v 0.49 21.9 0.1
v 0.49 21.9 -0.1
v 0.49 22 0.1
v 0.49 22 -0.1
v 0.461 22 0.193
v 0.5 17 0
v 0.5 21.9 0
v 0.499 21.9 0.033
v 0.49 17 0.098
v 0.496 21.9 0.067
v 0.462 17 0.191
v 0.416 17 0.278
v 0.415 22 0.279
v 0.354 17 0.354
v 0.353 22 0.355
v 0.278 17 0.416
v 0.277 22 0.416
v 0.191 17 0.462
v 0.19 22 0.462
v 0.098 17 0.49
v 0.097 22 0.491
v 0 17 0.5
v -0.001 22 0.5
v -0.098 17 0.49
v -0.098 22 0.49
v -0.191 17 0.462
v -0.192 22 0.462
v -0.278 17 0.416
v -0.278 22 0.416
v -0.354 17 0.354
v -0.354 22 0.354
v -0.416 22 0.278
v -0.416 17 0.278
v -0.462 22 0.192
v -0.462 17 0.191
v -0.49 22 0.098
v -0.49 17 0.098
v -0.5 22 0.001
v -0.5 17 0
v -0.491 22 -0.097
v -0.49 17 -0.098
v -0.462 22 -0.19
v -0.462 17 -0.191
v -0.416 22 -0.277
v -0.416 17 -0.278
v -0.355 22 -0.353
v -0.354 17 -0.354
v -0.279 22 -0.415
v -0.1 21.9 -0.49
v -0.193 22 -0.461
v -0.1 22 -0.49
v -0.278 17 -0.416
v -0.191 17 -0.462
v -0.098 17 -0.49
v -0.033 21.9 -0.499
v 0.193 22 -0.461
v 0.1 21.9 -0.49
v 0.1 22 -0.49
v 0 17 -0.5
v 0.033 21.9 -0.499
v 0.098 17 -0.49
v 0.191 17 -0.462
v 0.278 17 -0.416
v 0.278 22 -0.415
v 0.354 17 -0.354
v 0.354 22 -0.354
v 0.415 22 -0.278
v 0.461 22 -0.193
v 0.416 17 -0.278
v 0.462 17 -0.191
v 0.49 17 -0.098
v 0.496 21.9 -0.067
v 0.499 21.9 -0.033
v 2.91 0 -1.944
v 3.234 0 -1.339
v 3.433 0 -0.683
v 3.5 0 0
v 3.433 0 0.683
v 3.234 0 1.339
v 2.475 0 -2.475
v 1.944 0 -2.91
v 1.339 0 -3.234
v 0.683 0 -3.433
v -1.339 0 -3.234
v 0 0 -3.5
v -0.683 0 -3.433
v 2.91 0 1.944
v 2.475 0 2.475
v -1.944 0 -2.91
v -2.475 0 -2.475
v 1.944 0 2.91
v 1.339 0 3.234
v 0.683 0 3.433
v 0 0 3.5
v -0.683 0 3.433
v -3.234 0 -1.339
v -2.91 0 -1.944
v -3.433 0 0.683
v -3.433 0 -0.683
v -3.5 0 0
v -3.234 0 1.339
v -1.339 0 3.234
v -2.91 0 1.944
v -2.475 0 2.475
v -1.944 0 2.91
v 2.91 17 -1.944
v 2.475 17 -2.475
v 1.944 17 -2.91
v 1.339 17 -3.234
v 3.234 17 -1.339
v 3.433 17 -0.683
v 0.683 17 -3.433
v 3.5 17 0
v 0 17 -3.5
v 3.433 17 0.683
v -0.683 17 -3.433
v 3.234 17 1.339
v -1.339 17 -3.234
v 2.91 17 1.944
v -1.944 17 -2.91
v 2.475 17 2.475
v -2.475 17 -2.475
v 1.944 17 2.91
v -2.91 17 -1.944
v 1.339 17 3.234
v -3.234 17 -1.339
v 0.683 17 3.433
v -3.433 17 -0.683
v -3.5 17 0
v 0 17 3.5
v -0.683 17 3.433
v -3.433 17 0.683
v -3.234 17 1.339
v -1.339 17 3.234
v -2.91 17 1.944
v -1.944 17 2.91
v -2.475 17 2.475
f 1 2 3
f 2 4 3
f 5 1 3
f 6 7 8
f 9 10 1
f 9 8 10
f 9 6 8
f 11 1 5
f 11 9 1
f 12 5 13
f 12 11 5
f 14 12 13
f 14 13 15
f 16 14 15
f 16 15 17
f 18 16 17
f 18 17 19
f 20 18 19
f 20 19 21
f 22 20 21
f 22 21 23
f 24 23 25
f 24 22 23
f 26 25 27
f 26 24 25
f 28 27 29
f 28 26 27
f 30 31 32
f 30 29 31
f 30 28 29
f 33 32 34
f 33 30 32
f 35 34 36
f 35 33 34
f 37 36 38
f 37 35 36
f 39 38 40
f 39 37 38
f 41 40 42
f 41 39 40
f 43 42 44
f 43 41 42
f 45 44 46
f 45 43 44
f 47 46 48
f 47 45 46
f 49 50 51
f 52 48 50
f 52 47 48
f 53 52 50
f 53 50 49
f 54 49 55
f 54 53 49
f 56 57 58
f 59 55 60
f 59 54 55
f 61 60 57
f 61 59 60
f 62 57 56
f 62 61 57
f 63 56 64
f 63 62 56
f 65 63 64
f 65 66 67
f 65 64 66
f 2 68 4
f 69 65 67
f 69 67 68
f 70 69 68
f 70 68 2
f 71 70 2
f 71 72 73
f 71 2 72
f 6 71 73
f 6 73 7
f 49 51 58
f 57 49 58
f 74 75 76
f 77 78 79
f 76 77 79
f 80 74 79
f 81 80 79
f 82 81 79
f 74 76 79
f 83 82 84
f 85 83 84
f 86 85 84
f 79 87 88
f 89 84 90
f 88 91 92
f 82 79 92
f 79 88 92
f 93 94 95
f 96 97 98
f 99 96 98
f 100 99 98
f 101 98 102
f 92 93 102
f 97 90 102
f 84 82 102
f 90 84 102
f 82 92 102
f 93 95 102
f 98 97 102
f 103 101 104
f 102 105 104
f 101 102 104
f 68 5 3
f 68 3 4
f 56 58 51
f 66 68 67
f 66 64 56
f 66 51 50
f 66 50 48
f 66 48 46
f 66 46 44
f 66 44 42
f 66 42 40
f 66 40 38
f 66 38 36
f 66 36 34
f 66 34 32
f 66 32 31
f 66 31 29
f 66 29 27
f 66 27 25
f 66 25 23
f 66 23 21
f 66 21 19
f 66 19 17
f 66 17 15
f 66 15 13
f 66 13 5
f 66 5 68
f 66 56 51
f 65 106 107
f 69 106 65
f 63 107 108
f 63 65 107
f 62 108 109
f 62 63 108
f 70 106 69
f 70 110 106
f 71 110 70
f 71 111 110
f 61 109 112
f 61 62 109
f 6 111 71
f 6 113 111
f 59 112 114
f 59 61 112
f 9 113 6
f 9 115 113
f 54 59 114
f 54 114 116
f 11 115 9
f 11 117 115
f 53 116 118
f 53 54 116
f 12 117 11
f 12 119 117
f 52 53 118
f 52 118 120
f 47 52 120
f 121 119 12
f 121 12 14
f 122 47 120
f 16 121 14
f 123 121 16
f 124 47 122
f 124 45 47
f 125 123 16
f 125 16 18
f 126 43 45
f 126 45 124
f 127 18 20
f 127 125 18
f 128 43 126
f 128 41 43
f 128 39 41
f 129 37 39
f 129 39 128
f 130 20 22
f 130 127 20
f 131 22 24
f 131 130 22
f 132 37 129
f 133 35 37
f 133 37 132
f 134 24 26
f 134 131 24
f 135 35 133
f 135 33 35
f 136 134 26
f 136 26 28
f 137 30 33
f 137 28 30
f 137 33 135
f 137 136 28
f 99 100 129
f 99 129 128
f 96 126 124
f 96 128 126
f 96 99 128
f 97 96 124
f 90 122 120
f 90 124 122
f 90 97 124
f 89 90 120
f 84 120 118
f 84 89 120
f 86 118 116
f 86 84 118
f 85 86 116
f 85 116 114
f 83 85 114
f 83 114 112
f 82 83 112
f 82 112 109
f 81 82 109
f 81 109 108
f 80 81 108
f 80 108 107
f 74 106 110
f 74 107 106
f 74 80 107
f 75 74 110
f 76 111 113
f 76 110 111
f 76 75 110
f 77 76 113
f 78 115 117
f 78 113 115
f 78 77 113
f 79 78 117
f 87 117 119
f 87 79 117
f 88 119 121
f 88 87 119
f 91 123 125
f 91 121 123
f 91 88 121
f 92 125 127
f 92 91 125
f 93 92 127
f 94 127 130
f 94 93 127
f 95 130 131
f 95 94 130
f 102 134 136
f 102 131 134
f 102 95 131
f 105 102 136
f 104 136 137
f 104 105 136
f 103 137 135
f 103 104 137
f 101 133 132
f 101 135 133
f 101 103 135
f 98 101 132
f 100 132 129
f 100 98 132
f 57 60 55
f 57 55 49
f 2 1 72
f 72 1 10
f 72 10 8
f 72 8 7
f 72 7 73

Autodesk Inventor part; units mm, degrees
ref_plane "YZ Plane" through (0, 0, 0) normal (1, 0, 0) x (0, 1, 0)
ref_plane "XZ Plane" through (0, 0, 0) normal (0, 1, 0) x (-1, 0, 0)
ref_plane "XY Plane" through (0, 0, 0) normal (0, 0, 1) x (1, 0, 0)
sketch "Sketch1" plane through (0, 0, 0) normal (0, 1, 0) x (-1, 0, 0)
  circle A0 centre (0, 0) radius 3.5
  dimension "d0" = 7
extrude "Extrusion1" add sketch "Sketch1" along normal blind 17
sketch "Sketch2" plane through (0, 17, 0) normal (0, 1, 0) x (1, 0, 0)
  circle A0 centre (0, 0) radius 0.5
  dimension "d3" = 1
extrude "Extrusion2" add sketch "Sketch2" along normal blind 5
sketch "Sketch3" plane through (0, 22, 0) normal (0, 1, 0) x (1, 0, 0)
  circle A0 centre (0, 0) radius 0.5 projected
  line L0 (-0.0995, 0.49) -> (0.0995, 0.49)
  circle A1 centre (0, 0) radius 0.5 projected
  line L1 (0.4999, 0.0075) -> (0.4999, 0.0075)
  line L2 (0.49, 0.0995) -> (0.49, -0.0995)
  dimension "d8" = 0.49
  dimension "d9" = 0.49
extrude "Extrusion3" cut sketch "Sketch3" against normal blind 0.1 contours A0 L2 | L0 A0
properties part number "motor" material "Steel"
